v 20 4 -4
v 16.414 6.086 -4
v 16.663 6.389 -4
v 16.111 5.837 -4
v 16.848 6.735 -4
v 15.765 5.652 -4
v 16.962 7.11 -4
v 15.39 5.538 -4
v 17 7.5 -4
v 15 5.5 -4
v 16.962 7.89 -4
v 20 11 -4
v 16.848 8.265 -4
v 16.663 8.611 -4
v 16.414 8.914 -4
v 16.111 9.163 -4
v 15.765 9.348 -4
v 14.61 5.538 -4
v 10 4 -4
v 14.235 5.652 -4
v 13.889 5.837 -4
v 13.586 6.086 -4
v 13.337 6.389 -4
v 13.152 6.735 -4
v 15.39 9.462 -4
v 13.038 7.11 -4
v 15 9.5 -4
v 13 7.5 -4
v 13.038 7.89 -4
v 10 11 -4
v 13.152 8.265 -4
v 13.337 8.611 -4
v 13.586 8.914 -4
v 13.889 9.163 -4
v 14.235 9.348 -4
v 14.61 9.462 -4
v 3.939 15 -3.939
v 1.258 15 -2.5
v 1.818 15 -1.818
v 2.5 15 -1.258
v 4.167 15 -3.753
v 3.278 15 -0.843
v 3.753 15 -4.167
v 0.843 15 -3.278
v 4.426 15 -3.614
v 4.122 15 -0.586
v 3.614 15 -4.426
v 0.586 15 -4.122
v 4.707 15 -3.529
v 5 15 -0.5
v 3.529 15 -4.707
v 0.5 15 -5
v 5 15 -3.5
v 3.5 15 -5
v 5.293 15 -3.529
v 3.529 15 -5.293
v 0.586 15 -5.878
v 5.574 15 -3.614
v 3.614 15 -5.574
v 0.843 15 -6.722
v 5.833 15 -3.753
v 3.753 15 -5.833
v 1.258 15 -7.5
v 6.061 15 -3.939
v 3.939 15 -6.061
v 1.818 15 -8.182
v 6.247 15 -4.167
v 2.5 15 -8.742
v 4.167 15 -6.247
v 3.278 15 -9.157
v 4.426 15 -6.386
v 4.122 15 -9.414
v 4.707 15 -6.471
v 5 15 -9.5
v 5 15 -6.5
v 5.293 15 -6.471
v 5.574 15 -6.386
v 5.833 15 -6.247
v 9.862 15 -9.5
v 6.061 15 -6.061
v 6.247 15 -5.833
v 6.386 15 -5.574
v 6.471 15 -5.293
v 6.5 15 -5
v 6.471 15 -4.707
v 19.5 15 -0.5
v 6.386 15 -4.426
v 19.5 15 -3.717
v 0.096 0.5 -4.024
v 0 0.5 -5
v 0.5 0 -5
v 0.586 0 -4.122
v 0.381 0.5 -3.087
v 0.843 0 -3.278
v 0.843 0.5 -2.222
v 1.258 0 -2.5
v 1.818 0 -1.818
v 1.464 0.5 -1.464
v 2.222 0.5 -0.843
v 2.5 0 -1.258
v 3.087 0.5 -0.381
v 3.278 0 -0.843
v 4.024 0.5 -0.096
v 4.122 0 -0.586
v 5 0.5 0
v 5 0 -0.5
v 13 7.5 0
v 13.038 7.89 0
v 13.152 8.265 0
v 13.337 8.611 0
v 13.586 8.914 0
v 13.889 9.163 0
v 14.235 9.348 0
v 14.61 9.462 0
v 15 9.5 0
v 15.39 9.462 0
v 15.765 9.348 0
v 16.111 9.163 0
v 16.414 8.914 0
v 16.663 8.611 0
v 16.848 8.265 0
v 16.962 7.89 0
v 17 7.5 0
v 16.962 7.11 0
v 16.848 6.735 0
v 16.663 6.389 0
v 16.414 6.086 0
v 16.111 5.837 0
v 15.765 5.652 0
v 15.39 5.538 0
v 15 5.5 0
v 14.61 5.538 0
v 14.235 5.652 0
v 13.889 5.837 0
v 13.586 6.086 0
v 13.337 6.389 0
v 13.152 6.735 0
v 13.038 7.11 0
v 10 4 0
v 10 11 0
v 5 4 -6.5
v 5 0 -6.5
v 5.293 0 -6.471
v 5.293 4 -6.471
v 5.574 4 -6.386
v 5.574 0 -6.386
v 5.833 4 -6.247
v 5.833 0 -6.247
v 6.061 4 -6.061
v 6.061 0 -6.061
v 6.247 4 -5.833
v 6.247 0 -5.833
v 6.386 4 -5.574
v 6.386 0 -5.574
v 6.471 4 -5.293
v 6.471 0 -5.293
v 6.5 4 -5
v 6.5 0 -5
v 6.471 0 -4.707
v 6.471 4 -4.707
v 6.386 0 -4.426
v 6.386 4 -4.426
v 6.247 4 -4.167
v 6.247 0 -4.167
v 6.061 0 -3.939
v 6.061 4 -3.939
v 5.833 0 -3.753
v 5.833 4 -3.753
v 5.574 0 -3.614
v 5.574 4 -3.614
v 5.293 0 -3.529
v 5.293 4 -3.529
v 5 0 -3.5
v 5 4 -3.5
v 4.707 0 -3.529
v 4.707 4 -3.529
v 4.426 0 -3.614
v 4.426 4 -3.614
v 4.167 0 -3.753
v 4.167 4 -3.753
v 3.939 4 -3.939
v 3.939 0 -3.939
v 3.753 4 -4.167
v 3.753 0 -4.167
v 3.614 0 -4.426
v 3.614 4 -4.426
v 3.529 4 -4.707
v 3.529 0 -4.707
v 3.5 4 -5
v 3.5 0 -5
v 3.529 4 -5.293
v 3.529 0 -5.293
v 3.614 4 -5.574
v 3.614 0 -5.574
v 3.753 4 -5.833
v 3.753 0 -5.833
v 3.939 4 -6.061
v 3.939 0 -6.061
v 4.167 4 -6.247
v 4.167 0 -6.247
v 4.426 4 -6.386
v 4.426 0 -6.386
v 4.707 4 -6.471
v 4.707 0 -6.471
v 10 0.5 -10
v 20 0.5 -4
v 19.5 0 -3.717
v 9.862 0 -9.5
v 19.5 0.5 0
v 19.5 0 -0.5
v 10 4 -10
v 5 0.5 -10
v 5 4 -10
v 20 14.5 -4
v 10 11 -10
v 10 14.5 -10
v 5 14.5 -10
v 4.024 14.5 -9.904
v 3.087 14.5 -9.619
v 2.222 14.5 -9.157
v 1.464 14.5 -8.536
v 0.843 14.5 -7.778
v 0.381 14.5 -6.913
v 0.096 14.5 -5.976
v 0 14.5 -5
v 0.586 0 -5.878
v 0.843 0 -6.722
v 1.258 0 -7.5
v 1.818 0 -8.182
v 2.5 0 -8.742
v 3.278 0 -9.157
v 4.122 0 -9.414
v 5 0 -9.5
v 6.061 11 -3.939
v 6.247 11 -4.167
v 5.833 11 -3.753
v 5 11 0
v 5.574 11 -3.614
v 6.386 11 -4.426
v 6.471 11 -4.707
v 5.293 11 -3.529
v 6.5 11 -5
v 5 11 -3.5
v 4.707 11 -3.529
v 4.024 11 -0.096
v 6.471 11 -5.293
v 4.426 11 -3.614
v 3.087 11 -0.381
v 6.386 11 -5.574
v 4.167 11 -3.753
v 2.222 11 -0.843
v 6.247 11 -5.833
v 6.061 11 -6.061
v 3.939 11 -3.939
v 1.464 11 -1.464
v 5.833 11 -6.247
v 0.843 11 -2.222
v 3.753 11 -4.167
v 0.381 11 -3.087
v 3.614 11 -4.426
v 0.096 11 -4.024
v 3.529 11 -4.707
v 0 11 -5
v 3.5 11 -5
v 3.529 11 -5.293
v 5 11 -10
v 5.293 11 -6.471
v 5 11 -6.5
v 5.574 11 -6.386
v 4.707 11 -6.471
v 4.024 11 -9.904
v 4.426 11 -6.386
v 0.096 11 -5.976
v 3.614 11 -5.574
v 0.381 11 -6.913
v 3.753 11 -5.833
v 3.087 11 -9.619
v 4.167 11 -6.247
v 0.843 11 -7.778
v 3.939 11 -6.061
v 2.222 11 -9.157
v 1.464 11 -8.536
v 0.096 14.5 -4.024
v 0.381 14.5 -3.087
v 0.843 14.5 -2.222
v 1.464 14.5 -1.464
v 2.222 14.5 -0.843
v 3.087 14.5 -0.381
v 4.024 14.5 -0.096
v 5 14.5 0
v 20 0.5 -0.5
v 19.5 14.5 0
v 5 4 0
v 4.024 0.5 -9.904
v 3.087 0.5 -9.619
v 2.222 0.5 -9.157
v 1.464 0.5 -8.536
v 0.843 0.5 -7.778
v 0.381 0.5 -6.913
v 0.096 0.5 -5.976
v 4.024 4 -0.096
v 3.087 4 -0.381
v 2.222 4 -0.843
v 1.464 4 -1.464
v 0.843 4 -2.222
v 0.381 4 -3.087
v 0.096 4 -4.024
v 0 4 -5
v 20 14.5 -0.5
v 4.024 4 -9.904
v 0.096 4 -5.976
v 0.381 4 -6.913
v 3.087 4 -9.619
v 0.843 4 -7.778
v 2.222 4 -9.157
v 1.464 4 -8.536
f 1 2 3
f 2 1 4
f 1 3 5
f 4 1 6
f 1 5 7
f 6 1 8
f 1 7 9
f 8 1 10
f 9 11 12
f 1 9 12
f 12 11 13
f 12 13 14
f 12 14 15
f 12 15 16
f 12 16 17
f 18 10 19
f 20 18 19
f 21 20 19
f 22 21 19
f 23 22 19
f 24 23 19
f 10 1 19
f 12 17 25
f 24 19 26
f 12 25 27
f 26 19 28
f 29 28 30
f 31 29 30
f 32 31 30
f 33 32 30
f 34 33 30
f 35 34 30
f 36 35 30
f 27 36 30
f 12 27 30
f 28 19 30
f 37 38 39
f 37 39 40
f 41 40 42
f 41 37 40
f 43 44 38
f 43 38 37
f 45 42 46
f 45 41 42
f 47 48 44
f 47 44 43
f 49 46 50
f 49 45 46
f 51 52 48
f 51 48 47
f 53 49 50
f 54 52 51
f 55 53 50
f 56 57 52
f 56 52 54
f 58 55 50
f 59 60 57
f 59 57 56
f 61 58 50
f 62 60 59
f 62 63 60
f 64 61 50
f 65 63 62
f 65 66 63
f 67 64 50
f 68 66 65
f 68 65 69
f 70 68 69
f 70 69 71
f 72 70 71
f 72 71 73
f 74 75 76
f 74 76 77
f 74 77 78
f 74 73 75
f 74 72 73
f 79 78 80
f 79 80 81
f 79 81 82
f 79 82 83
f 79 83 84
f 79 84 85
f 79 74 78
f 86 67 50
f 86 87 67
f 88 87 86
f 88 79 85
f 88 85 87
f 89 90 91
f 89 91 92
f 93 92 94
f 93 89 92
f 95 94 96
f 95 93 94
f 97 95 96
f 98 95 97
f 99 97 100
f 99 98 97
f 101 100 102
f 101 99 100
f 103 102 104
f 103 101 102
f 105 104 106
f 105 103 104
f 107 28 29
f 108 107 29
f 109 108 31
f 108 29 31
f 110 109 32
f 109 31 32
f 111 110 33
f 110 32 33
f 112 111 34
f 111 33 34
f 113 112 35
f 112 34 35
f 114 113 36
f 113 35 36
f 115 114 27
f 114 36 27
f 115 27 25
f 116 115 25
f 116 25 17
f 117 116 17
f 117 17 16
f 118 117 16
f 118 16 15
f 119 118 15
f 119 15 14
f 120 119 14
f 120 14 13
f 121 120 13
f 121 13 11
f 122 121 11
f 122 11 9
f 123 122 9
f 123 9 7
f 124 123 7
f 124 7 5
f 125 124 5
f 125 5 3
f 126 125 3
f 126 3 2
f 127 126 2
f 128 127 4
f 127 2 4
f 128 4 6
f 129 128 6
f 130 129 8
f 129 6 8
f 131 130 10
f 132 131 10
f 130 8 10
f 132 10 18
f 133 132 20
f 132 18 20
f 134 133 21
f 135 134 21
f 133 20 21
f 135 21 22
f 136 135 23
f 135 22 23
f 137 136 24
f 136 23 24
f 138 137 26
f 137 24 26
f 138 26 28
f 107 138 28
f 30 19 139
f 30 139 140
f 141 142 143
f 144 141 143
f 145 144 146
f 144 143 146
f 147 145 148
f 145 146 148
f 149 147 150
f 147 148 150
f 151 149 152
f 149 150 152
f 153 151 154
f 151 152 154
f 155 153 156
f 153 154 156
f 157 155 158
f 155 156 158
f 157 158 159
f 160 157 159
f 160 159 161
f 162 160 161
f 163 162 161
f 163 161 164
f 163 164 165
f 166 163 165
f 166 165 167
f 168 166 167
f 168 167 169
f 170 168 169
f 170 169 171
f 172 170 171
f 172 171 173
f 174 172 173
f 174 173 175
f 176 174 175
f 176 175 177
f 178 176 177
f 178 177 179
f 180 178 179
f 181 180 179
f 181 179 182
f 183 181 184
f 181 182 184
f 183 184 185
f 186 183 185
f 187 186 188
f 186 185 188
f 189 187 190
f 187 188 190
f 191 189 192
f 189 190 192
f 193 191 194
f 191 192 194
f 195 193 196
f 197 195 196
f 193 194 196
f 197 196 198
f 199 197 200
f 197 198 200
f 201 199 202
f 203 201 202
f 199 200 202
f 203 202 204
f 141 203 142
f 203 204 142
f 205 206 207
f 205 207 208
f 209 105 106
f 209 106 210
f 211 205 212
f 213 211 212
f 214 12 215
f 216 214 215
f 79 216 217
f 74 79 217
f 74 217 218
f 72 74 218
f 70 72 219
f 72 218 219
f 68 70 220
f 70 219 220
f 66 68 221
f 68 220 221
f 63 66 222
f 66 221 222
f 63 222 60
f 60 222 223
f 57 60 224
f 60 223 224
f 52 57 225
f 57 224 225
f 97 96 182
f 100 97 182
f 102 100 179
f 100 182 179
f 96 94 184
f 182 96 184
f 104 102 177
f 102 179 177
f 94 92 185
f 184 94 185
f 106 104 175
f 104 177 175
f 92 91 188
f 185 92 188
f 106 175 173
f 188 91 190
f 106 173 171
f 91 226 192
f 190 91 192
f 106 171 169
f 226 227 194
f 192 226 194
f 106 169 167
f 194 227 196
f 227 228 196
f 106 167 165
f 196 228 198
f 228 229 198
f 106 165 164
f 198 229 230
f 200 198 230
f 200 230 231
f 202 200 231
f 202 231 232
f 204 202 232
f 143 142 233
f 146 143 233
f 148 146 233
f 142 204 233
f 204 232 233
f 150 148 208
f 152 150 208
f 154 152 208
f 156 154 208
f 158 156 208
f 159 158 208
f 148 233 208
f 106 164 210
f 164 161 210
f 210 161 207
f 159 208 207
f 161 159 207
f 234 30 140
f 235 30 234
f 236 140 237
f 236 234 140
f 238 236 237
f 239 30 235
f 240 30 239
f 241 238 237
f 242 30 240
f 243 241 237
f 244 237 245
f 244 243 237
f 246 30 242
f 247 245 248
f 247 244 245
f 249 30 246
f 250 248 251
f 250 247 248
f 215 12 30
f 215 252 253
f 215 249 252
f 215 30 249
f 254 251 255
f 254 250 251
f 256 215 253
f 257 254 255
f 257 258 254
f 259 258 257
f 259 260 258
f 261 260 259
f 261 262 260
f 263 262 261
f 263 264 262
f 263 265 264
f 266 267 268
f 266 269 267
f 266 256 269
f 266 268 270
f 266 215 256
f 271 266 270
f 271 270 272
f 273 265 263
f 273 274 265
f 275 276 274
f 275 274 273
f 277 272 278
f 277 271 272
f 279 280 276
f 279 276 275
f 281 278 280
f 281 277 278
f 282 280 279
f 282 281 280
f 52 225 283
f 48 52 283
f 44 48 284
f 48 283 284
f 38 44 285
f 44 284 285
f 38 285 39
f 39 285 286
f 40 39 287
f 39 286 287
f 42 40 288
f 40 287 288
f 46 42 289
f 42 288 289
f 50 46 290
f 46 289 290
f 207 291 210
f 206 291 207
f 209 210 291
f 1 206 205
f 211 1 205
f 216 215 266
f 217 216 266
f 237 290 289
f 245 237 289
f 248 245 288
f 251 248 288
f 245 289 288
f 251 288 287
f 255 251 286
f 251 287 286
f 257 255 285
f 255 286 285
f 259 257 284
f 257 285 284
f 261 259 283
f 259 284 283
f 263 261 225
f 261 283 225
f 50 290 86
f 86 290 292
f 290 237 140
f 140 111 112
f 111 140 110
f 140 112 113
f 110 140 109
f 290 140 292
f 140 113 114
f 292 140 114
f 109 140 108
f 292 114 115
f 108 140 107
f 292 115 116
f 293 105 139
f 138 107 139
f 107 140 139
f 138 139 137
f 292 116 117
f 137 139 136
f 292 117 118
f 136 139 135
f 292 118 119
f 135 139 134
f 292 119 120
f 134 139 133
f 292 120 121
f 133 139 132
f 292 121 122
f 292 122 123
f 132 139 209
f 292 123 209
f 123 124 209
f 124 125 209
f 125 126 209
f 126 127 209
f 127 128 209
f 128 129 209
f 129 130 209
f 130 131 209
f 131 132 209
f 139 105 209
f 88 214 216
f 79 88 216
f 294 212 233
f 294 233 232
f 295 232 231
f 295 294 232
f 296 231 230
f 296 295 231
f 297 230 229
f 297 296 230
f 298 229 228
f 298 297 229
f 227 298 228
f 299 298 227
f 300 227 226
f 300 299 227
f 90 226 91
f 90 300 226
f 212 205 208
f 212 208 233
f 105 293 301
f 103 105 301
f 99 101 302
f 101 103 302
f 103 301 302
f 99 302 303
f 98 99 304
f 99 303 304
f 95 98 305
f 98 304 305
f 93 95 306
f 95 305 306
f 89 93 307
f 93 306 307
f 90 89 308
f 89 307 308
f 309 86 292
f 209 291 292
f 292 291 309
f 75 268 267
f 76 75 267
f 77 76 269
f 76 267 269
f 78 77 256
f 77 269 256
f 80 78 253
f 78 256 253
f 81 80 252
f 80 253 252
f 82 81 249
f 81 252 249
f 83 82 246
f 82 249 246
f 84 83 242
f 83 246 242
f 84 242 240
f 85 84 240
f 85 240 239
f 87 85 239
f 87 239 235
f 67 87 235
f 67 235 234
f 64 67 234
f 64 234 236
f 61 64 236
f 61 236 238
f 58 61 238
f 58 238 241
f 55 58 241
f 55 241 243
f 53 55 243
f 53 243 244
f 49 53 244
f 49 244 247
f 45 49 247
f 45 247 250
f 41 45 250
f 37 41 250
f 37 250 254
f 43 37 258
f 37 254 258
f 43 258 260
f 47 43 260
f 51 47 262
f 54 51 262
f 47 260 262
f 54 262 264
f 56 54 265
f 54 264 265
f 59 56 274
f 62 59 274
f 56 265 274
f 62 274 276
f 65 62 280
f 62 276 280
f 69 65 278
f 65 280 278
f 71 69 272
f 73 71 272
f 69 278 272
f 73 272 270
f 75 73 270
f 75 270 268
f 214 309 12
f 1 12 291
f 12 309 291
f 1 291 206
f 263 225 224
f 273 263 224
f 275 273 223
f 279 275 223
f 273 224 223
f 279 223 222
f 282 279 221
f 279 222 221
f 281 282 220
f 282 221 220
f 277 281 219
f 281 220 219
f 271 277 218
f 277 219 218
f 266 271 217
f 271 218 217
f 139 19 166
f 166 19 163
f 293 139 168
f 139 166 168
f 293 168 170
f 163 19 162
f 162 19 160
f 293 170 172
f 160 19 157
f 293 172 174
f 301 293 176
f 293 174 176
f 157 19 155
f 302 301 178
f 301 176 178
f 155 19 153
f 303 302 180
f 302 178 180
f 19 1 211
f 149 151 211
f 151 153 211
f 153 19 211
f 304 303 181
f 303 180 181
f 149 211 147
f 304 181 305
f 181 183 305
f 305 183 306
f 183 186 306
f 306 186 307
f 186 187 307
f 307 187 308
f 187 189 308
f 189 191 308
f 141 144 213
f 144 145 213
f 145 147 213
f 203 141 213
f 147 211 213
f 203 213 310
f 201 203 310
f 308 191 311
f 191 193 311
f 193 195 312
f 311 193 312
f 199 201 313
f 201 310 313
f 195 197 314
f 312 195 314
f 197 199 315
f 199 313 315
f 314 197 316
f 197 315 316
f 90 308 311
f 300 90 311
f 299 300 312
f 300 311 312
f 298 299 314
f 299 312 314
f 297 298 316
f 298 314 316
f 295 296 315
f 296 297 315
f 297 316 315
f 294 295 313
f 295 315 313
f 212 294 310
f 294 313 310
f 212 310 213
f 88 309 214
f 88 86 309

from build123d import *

# Parameters (mm, degrees)
EXTRUDE_1_DEPTH     = 15
SKETCH_2_W          = 10
SKETCH_2_H          = 7
CUT_EXTRUDE_1_DEPTH = 27.925824036
SKETCH_3_W          = 6
SKETCH_3_H          = 7
CUT_EXTRUDE_2_DEPTH = 21.615528128
SKETCH_4_R          = 2
CUT_EXTRUDE_3_DEPTH = 26.709920264
FILLET_1_R          = 5
SKETCH_5_R          = 1.5
CUT_EXTRUDE_4_DEPTH = 27.925824036
CHAMFER_1_SIZE      = 0.5


with BuildPart() as part:
    # ｽｹｯﾁ1 → ﾎﾞｽ - 押し出し1 (new body)
    with BuildSketch(Plane(origin=(0, 0, 0), x_dir=(1, 0, 0), z_dir=(0, 1, 0))):
        Polygon((0, 0), (20, 0), (20, 4), (10, 10), (0, 10), align=None)
    extrude(amount=EXTRUDE_1_DEPTH)

    # ｽｹｯﾁ2 → ｶｯﾄ - 押し出し1 (cut, through all)
    with BuildSketch(Plane(origin=(0, 0, -10), x_dir=(-1, 0, 0), z_dir=(0, 0, -1))):
        with Locations((-5, 7.5)):
            Rectangle(SKETCH_2_W, SKETCH_2_H)
    extrude(amount=-CUT_EXTRUDE_1_DEPTH, mode=Mode.SUBTRACT)

    # ｽｹｯﾁ3 → ｶｯﾄ - 押し出し2 (cut, through all)
    with BuildSketch(Plane.ZY.offset(-10)):
        with Locations((-7, 7.5)):
            Rectangle(SKETCH_3_W, SKETCH_3_H)
    extrude(amount=-CUT_EXTRUDE_2_DEPTH, mode=Mode.SUBTRACT)

    # ｽｹｯﾁ4 → ｶｯﾄ - 押し出し3 (cut, through all)
    with BuildSketch(Plane(origin=(0, 0, -4), x_dir=(-1, 0, 0), z_dir=(0, 0, -1))):
        with Locations((-15, 7.5)):
            Circle(SKETCH_4_R)
    extrude(amount=-CUT_EXTRUDE_3_DEPTH, mode=Mode.SUBTRACT)

    # ﾌｨﾚｯﾄ1
    fillet_1_edges = [part.edges().sort_by_distance(p)[0] for p in [
        (0, 2, 0),
        (0, 2, -10),
        (0, 13, 0),
        (0, 13, -10),
    ]]
    fillet(fillet_1_edges, radius=FILLET_1_R - 0.0001)  # a hair under: the kernel refuses the full size

    # ｽｹｯﾁ5 → ｶｯﾄ - 押し出し4 (cut, through all)
    with BuildSketch(Plane.XZ):
        with Locations(Location((5, -5, 0), (0, 0, 270))):
            Circle(SKETCH_5_R)
    extrude(amount=-CUT_EXTRUDE_4_DEPTH, mode=Mode.SUBTRACT)

    # 面取り1
    chamfer_1_edges = [part.edges().sort_by_distance(p)[0] for p in [
        (20, 15, -2),
        (15, 15, -7),
        (7.49995, 15, -10),
        (7.49995, 0, -10),
        (12.49995, 0, 0),
        (12.49995, 15, 0),
        (15, 0, -7),
        (1.464436805, 0, -8.535563195),
        (1.464436805, 0, -1.464436805),
        (20, 0, -2),
        (1.464436805, 15, -8.535563195),
        (1.464436805, 15, -1.464436805),
        (20, 7.5, 0),
    ]]
    chamfer(chamfer_1_edges, length=CHAMFER_1_SIZE)


solid = part.part
